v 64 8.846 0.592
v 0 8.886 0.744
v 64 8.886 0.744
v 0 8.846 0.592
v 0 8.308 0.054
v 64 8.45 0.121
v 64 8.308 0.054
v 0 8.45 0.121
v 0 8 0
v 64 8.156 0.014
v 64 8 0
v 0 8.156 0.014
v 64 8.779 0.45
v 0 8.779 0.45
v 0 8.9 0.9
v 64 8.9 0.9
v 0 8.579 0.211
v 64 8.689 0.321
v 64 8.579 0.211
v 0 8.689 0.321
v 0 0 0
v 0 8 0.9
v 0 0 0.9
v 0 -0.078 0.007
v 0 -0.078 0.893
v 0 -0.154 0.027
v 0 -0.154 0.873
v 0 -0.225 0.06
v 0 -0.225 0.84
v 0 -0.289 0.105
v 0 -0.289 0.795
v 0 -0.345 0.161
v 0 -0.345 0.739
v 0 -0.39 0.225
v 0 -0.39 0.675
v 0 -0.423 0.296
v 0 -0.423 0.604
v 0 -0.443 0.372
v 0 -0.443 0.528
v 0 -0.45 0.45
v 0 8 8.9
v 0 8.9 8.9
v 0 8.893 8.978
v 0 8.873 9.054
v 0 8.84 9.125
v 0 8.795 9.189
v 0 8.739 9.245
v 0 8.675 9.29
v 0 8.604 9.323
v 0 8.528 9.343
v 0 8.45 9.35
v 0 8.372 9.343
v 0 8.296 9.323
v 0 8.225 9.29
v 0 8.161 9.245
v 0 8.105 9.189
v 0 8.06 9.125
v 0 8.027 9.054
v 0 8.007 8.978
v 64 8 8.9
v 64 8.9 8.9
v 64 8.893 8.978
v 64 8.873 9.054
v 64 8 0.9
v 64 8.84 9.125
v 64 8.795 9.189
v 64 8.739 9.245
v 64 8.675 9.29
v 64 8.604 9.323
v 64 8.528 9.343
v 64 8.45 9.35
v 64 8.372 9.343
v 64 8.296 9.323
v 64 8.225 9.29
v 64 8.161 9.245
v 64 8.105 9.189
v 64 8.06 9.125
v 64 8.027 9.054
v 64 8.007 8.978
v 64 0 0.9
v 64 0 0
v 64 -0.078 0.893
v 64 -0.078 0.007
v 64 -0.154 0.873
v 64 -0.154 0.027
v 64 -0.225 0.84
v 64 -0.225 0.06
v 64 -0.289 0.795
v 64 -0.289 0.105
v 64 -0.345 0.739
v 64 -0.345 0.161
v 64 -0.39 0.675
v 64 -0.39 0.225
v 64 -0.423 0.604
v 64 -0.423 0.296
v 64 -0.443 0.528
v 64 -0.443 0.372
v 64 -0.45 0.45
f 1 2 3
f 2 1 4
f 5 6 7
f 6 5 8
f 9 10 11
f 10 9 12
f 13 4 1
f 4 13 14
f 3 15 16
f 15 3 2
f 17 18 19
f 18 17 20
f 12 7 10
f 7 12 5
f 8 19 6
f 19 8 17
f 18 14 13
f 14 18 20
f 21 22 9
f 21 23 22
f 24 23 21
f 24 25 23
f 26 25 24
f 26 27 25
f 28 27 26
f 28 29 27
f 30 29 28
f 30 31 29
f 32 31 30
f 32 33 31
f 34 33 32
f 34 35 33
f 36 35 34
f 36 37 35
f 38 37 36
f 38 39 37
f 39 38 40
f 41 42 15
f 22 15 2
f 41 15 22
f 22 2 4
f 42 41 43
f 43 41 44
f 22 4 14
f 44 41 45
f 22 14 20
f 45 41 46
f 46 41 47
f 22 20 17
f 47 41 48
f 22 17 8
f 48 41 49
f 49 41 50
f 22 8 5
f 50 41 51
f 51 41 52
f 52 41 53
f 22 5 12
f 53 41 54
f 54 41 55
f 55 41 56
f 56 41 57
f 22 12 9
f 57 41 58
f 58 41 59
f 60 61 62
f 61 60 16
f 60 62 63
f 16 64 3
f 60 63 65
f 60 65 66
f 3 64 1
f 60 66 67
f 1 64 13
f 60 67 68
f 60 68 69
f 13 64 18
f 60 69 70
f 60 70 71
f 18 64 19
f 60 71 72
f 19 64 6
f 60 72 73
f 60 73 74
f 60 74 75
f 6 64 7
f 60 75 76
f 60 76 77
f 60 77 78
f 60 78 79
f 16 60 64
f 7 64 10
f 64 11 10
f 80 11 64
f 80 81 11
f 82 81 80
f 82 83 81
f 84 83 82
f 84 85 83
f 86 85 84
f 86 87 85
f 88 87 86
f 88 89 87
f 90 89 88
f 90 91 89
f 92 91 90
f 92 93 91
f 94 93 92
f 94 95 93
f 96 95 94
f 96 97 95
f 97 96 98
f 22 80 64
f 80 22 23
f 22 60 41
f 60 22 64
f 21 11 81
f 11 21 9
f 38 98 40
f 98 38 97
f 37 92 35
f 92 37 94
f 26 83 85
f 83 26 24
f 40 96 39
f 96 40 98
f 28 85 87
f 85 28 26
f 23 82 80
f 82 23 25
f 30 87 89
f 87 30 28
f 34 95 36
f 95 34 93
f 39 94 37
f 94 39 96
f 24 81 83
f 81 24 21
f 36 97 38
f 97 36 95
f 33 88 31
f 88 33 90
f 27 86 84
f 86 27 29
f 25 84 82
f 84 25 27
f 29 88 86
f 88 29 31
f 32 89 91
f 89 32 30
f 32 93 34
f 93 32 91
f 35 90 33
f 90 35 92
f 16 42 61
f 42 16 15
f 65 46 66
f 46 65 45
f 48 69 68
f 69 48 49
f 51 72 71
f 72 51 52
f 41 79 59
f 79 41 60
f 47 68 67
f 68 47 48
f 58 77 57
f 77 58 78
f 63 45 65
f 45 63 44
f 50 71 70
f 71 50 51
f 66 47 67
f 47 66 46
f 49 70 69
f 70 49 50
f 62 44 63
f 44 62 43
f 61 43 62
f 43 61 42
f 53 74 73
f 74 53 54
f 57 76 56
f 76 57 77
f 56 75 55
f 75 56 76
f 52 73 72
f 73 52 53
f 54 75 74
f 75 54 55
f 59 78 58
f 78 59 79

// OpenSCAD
t=0.9; //0.3 + 3*0.2 //also 0.3 + 0.6 = 0.9
w=64;
h=8;
$fn=36;

cube([w,h,t]); //unten

translate([0,0,t/2])
color("green")
rotate([0,90,0])
cylinder(h=w,r=t/2);

//verbinder
//translate([0,h,0]) 
//color("red")
//cube([w,t,t]);

difference() {
//verbinder abgerundet als zylinder
translate([0,h,t])
rotate([0,90,0])
color("blue")
cylinder(h=w,r=t);

translate([0,h-t,t]) 
color("yellow")
cube([w,t,t]);
}


translate([0,h,t]) //hinten
cube([w,t,h]);

translate([0,h+t/2,h+t])
color("green")
rotate([0,90,0])
cylinder(h=w,r=t/2);
